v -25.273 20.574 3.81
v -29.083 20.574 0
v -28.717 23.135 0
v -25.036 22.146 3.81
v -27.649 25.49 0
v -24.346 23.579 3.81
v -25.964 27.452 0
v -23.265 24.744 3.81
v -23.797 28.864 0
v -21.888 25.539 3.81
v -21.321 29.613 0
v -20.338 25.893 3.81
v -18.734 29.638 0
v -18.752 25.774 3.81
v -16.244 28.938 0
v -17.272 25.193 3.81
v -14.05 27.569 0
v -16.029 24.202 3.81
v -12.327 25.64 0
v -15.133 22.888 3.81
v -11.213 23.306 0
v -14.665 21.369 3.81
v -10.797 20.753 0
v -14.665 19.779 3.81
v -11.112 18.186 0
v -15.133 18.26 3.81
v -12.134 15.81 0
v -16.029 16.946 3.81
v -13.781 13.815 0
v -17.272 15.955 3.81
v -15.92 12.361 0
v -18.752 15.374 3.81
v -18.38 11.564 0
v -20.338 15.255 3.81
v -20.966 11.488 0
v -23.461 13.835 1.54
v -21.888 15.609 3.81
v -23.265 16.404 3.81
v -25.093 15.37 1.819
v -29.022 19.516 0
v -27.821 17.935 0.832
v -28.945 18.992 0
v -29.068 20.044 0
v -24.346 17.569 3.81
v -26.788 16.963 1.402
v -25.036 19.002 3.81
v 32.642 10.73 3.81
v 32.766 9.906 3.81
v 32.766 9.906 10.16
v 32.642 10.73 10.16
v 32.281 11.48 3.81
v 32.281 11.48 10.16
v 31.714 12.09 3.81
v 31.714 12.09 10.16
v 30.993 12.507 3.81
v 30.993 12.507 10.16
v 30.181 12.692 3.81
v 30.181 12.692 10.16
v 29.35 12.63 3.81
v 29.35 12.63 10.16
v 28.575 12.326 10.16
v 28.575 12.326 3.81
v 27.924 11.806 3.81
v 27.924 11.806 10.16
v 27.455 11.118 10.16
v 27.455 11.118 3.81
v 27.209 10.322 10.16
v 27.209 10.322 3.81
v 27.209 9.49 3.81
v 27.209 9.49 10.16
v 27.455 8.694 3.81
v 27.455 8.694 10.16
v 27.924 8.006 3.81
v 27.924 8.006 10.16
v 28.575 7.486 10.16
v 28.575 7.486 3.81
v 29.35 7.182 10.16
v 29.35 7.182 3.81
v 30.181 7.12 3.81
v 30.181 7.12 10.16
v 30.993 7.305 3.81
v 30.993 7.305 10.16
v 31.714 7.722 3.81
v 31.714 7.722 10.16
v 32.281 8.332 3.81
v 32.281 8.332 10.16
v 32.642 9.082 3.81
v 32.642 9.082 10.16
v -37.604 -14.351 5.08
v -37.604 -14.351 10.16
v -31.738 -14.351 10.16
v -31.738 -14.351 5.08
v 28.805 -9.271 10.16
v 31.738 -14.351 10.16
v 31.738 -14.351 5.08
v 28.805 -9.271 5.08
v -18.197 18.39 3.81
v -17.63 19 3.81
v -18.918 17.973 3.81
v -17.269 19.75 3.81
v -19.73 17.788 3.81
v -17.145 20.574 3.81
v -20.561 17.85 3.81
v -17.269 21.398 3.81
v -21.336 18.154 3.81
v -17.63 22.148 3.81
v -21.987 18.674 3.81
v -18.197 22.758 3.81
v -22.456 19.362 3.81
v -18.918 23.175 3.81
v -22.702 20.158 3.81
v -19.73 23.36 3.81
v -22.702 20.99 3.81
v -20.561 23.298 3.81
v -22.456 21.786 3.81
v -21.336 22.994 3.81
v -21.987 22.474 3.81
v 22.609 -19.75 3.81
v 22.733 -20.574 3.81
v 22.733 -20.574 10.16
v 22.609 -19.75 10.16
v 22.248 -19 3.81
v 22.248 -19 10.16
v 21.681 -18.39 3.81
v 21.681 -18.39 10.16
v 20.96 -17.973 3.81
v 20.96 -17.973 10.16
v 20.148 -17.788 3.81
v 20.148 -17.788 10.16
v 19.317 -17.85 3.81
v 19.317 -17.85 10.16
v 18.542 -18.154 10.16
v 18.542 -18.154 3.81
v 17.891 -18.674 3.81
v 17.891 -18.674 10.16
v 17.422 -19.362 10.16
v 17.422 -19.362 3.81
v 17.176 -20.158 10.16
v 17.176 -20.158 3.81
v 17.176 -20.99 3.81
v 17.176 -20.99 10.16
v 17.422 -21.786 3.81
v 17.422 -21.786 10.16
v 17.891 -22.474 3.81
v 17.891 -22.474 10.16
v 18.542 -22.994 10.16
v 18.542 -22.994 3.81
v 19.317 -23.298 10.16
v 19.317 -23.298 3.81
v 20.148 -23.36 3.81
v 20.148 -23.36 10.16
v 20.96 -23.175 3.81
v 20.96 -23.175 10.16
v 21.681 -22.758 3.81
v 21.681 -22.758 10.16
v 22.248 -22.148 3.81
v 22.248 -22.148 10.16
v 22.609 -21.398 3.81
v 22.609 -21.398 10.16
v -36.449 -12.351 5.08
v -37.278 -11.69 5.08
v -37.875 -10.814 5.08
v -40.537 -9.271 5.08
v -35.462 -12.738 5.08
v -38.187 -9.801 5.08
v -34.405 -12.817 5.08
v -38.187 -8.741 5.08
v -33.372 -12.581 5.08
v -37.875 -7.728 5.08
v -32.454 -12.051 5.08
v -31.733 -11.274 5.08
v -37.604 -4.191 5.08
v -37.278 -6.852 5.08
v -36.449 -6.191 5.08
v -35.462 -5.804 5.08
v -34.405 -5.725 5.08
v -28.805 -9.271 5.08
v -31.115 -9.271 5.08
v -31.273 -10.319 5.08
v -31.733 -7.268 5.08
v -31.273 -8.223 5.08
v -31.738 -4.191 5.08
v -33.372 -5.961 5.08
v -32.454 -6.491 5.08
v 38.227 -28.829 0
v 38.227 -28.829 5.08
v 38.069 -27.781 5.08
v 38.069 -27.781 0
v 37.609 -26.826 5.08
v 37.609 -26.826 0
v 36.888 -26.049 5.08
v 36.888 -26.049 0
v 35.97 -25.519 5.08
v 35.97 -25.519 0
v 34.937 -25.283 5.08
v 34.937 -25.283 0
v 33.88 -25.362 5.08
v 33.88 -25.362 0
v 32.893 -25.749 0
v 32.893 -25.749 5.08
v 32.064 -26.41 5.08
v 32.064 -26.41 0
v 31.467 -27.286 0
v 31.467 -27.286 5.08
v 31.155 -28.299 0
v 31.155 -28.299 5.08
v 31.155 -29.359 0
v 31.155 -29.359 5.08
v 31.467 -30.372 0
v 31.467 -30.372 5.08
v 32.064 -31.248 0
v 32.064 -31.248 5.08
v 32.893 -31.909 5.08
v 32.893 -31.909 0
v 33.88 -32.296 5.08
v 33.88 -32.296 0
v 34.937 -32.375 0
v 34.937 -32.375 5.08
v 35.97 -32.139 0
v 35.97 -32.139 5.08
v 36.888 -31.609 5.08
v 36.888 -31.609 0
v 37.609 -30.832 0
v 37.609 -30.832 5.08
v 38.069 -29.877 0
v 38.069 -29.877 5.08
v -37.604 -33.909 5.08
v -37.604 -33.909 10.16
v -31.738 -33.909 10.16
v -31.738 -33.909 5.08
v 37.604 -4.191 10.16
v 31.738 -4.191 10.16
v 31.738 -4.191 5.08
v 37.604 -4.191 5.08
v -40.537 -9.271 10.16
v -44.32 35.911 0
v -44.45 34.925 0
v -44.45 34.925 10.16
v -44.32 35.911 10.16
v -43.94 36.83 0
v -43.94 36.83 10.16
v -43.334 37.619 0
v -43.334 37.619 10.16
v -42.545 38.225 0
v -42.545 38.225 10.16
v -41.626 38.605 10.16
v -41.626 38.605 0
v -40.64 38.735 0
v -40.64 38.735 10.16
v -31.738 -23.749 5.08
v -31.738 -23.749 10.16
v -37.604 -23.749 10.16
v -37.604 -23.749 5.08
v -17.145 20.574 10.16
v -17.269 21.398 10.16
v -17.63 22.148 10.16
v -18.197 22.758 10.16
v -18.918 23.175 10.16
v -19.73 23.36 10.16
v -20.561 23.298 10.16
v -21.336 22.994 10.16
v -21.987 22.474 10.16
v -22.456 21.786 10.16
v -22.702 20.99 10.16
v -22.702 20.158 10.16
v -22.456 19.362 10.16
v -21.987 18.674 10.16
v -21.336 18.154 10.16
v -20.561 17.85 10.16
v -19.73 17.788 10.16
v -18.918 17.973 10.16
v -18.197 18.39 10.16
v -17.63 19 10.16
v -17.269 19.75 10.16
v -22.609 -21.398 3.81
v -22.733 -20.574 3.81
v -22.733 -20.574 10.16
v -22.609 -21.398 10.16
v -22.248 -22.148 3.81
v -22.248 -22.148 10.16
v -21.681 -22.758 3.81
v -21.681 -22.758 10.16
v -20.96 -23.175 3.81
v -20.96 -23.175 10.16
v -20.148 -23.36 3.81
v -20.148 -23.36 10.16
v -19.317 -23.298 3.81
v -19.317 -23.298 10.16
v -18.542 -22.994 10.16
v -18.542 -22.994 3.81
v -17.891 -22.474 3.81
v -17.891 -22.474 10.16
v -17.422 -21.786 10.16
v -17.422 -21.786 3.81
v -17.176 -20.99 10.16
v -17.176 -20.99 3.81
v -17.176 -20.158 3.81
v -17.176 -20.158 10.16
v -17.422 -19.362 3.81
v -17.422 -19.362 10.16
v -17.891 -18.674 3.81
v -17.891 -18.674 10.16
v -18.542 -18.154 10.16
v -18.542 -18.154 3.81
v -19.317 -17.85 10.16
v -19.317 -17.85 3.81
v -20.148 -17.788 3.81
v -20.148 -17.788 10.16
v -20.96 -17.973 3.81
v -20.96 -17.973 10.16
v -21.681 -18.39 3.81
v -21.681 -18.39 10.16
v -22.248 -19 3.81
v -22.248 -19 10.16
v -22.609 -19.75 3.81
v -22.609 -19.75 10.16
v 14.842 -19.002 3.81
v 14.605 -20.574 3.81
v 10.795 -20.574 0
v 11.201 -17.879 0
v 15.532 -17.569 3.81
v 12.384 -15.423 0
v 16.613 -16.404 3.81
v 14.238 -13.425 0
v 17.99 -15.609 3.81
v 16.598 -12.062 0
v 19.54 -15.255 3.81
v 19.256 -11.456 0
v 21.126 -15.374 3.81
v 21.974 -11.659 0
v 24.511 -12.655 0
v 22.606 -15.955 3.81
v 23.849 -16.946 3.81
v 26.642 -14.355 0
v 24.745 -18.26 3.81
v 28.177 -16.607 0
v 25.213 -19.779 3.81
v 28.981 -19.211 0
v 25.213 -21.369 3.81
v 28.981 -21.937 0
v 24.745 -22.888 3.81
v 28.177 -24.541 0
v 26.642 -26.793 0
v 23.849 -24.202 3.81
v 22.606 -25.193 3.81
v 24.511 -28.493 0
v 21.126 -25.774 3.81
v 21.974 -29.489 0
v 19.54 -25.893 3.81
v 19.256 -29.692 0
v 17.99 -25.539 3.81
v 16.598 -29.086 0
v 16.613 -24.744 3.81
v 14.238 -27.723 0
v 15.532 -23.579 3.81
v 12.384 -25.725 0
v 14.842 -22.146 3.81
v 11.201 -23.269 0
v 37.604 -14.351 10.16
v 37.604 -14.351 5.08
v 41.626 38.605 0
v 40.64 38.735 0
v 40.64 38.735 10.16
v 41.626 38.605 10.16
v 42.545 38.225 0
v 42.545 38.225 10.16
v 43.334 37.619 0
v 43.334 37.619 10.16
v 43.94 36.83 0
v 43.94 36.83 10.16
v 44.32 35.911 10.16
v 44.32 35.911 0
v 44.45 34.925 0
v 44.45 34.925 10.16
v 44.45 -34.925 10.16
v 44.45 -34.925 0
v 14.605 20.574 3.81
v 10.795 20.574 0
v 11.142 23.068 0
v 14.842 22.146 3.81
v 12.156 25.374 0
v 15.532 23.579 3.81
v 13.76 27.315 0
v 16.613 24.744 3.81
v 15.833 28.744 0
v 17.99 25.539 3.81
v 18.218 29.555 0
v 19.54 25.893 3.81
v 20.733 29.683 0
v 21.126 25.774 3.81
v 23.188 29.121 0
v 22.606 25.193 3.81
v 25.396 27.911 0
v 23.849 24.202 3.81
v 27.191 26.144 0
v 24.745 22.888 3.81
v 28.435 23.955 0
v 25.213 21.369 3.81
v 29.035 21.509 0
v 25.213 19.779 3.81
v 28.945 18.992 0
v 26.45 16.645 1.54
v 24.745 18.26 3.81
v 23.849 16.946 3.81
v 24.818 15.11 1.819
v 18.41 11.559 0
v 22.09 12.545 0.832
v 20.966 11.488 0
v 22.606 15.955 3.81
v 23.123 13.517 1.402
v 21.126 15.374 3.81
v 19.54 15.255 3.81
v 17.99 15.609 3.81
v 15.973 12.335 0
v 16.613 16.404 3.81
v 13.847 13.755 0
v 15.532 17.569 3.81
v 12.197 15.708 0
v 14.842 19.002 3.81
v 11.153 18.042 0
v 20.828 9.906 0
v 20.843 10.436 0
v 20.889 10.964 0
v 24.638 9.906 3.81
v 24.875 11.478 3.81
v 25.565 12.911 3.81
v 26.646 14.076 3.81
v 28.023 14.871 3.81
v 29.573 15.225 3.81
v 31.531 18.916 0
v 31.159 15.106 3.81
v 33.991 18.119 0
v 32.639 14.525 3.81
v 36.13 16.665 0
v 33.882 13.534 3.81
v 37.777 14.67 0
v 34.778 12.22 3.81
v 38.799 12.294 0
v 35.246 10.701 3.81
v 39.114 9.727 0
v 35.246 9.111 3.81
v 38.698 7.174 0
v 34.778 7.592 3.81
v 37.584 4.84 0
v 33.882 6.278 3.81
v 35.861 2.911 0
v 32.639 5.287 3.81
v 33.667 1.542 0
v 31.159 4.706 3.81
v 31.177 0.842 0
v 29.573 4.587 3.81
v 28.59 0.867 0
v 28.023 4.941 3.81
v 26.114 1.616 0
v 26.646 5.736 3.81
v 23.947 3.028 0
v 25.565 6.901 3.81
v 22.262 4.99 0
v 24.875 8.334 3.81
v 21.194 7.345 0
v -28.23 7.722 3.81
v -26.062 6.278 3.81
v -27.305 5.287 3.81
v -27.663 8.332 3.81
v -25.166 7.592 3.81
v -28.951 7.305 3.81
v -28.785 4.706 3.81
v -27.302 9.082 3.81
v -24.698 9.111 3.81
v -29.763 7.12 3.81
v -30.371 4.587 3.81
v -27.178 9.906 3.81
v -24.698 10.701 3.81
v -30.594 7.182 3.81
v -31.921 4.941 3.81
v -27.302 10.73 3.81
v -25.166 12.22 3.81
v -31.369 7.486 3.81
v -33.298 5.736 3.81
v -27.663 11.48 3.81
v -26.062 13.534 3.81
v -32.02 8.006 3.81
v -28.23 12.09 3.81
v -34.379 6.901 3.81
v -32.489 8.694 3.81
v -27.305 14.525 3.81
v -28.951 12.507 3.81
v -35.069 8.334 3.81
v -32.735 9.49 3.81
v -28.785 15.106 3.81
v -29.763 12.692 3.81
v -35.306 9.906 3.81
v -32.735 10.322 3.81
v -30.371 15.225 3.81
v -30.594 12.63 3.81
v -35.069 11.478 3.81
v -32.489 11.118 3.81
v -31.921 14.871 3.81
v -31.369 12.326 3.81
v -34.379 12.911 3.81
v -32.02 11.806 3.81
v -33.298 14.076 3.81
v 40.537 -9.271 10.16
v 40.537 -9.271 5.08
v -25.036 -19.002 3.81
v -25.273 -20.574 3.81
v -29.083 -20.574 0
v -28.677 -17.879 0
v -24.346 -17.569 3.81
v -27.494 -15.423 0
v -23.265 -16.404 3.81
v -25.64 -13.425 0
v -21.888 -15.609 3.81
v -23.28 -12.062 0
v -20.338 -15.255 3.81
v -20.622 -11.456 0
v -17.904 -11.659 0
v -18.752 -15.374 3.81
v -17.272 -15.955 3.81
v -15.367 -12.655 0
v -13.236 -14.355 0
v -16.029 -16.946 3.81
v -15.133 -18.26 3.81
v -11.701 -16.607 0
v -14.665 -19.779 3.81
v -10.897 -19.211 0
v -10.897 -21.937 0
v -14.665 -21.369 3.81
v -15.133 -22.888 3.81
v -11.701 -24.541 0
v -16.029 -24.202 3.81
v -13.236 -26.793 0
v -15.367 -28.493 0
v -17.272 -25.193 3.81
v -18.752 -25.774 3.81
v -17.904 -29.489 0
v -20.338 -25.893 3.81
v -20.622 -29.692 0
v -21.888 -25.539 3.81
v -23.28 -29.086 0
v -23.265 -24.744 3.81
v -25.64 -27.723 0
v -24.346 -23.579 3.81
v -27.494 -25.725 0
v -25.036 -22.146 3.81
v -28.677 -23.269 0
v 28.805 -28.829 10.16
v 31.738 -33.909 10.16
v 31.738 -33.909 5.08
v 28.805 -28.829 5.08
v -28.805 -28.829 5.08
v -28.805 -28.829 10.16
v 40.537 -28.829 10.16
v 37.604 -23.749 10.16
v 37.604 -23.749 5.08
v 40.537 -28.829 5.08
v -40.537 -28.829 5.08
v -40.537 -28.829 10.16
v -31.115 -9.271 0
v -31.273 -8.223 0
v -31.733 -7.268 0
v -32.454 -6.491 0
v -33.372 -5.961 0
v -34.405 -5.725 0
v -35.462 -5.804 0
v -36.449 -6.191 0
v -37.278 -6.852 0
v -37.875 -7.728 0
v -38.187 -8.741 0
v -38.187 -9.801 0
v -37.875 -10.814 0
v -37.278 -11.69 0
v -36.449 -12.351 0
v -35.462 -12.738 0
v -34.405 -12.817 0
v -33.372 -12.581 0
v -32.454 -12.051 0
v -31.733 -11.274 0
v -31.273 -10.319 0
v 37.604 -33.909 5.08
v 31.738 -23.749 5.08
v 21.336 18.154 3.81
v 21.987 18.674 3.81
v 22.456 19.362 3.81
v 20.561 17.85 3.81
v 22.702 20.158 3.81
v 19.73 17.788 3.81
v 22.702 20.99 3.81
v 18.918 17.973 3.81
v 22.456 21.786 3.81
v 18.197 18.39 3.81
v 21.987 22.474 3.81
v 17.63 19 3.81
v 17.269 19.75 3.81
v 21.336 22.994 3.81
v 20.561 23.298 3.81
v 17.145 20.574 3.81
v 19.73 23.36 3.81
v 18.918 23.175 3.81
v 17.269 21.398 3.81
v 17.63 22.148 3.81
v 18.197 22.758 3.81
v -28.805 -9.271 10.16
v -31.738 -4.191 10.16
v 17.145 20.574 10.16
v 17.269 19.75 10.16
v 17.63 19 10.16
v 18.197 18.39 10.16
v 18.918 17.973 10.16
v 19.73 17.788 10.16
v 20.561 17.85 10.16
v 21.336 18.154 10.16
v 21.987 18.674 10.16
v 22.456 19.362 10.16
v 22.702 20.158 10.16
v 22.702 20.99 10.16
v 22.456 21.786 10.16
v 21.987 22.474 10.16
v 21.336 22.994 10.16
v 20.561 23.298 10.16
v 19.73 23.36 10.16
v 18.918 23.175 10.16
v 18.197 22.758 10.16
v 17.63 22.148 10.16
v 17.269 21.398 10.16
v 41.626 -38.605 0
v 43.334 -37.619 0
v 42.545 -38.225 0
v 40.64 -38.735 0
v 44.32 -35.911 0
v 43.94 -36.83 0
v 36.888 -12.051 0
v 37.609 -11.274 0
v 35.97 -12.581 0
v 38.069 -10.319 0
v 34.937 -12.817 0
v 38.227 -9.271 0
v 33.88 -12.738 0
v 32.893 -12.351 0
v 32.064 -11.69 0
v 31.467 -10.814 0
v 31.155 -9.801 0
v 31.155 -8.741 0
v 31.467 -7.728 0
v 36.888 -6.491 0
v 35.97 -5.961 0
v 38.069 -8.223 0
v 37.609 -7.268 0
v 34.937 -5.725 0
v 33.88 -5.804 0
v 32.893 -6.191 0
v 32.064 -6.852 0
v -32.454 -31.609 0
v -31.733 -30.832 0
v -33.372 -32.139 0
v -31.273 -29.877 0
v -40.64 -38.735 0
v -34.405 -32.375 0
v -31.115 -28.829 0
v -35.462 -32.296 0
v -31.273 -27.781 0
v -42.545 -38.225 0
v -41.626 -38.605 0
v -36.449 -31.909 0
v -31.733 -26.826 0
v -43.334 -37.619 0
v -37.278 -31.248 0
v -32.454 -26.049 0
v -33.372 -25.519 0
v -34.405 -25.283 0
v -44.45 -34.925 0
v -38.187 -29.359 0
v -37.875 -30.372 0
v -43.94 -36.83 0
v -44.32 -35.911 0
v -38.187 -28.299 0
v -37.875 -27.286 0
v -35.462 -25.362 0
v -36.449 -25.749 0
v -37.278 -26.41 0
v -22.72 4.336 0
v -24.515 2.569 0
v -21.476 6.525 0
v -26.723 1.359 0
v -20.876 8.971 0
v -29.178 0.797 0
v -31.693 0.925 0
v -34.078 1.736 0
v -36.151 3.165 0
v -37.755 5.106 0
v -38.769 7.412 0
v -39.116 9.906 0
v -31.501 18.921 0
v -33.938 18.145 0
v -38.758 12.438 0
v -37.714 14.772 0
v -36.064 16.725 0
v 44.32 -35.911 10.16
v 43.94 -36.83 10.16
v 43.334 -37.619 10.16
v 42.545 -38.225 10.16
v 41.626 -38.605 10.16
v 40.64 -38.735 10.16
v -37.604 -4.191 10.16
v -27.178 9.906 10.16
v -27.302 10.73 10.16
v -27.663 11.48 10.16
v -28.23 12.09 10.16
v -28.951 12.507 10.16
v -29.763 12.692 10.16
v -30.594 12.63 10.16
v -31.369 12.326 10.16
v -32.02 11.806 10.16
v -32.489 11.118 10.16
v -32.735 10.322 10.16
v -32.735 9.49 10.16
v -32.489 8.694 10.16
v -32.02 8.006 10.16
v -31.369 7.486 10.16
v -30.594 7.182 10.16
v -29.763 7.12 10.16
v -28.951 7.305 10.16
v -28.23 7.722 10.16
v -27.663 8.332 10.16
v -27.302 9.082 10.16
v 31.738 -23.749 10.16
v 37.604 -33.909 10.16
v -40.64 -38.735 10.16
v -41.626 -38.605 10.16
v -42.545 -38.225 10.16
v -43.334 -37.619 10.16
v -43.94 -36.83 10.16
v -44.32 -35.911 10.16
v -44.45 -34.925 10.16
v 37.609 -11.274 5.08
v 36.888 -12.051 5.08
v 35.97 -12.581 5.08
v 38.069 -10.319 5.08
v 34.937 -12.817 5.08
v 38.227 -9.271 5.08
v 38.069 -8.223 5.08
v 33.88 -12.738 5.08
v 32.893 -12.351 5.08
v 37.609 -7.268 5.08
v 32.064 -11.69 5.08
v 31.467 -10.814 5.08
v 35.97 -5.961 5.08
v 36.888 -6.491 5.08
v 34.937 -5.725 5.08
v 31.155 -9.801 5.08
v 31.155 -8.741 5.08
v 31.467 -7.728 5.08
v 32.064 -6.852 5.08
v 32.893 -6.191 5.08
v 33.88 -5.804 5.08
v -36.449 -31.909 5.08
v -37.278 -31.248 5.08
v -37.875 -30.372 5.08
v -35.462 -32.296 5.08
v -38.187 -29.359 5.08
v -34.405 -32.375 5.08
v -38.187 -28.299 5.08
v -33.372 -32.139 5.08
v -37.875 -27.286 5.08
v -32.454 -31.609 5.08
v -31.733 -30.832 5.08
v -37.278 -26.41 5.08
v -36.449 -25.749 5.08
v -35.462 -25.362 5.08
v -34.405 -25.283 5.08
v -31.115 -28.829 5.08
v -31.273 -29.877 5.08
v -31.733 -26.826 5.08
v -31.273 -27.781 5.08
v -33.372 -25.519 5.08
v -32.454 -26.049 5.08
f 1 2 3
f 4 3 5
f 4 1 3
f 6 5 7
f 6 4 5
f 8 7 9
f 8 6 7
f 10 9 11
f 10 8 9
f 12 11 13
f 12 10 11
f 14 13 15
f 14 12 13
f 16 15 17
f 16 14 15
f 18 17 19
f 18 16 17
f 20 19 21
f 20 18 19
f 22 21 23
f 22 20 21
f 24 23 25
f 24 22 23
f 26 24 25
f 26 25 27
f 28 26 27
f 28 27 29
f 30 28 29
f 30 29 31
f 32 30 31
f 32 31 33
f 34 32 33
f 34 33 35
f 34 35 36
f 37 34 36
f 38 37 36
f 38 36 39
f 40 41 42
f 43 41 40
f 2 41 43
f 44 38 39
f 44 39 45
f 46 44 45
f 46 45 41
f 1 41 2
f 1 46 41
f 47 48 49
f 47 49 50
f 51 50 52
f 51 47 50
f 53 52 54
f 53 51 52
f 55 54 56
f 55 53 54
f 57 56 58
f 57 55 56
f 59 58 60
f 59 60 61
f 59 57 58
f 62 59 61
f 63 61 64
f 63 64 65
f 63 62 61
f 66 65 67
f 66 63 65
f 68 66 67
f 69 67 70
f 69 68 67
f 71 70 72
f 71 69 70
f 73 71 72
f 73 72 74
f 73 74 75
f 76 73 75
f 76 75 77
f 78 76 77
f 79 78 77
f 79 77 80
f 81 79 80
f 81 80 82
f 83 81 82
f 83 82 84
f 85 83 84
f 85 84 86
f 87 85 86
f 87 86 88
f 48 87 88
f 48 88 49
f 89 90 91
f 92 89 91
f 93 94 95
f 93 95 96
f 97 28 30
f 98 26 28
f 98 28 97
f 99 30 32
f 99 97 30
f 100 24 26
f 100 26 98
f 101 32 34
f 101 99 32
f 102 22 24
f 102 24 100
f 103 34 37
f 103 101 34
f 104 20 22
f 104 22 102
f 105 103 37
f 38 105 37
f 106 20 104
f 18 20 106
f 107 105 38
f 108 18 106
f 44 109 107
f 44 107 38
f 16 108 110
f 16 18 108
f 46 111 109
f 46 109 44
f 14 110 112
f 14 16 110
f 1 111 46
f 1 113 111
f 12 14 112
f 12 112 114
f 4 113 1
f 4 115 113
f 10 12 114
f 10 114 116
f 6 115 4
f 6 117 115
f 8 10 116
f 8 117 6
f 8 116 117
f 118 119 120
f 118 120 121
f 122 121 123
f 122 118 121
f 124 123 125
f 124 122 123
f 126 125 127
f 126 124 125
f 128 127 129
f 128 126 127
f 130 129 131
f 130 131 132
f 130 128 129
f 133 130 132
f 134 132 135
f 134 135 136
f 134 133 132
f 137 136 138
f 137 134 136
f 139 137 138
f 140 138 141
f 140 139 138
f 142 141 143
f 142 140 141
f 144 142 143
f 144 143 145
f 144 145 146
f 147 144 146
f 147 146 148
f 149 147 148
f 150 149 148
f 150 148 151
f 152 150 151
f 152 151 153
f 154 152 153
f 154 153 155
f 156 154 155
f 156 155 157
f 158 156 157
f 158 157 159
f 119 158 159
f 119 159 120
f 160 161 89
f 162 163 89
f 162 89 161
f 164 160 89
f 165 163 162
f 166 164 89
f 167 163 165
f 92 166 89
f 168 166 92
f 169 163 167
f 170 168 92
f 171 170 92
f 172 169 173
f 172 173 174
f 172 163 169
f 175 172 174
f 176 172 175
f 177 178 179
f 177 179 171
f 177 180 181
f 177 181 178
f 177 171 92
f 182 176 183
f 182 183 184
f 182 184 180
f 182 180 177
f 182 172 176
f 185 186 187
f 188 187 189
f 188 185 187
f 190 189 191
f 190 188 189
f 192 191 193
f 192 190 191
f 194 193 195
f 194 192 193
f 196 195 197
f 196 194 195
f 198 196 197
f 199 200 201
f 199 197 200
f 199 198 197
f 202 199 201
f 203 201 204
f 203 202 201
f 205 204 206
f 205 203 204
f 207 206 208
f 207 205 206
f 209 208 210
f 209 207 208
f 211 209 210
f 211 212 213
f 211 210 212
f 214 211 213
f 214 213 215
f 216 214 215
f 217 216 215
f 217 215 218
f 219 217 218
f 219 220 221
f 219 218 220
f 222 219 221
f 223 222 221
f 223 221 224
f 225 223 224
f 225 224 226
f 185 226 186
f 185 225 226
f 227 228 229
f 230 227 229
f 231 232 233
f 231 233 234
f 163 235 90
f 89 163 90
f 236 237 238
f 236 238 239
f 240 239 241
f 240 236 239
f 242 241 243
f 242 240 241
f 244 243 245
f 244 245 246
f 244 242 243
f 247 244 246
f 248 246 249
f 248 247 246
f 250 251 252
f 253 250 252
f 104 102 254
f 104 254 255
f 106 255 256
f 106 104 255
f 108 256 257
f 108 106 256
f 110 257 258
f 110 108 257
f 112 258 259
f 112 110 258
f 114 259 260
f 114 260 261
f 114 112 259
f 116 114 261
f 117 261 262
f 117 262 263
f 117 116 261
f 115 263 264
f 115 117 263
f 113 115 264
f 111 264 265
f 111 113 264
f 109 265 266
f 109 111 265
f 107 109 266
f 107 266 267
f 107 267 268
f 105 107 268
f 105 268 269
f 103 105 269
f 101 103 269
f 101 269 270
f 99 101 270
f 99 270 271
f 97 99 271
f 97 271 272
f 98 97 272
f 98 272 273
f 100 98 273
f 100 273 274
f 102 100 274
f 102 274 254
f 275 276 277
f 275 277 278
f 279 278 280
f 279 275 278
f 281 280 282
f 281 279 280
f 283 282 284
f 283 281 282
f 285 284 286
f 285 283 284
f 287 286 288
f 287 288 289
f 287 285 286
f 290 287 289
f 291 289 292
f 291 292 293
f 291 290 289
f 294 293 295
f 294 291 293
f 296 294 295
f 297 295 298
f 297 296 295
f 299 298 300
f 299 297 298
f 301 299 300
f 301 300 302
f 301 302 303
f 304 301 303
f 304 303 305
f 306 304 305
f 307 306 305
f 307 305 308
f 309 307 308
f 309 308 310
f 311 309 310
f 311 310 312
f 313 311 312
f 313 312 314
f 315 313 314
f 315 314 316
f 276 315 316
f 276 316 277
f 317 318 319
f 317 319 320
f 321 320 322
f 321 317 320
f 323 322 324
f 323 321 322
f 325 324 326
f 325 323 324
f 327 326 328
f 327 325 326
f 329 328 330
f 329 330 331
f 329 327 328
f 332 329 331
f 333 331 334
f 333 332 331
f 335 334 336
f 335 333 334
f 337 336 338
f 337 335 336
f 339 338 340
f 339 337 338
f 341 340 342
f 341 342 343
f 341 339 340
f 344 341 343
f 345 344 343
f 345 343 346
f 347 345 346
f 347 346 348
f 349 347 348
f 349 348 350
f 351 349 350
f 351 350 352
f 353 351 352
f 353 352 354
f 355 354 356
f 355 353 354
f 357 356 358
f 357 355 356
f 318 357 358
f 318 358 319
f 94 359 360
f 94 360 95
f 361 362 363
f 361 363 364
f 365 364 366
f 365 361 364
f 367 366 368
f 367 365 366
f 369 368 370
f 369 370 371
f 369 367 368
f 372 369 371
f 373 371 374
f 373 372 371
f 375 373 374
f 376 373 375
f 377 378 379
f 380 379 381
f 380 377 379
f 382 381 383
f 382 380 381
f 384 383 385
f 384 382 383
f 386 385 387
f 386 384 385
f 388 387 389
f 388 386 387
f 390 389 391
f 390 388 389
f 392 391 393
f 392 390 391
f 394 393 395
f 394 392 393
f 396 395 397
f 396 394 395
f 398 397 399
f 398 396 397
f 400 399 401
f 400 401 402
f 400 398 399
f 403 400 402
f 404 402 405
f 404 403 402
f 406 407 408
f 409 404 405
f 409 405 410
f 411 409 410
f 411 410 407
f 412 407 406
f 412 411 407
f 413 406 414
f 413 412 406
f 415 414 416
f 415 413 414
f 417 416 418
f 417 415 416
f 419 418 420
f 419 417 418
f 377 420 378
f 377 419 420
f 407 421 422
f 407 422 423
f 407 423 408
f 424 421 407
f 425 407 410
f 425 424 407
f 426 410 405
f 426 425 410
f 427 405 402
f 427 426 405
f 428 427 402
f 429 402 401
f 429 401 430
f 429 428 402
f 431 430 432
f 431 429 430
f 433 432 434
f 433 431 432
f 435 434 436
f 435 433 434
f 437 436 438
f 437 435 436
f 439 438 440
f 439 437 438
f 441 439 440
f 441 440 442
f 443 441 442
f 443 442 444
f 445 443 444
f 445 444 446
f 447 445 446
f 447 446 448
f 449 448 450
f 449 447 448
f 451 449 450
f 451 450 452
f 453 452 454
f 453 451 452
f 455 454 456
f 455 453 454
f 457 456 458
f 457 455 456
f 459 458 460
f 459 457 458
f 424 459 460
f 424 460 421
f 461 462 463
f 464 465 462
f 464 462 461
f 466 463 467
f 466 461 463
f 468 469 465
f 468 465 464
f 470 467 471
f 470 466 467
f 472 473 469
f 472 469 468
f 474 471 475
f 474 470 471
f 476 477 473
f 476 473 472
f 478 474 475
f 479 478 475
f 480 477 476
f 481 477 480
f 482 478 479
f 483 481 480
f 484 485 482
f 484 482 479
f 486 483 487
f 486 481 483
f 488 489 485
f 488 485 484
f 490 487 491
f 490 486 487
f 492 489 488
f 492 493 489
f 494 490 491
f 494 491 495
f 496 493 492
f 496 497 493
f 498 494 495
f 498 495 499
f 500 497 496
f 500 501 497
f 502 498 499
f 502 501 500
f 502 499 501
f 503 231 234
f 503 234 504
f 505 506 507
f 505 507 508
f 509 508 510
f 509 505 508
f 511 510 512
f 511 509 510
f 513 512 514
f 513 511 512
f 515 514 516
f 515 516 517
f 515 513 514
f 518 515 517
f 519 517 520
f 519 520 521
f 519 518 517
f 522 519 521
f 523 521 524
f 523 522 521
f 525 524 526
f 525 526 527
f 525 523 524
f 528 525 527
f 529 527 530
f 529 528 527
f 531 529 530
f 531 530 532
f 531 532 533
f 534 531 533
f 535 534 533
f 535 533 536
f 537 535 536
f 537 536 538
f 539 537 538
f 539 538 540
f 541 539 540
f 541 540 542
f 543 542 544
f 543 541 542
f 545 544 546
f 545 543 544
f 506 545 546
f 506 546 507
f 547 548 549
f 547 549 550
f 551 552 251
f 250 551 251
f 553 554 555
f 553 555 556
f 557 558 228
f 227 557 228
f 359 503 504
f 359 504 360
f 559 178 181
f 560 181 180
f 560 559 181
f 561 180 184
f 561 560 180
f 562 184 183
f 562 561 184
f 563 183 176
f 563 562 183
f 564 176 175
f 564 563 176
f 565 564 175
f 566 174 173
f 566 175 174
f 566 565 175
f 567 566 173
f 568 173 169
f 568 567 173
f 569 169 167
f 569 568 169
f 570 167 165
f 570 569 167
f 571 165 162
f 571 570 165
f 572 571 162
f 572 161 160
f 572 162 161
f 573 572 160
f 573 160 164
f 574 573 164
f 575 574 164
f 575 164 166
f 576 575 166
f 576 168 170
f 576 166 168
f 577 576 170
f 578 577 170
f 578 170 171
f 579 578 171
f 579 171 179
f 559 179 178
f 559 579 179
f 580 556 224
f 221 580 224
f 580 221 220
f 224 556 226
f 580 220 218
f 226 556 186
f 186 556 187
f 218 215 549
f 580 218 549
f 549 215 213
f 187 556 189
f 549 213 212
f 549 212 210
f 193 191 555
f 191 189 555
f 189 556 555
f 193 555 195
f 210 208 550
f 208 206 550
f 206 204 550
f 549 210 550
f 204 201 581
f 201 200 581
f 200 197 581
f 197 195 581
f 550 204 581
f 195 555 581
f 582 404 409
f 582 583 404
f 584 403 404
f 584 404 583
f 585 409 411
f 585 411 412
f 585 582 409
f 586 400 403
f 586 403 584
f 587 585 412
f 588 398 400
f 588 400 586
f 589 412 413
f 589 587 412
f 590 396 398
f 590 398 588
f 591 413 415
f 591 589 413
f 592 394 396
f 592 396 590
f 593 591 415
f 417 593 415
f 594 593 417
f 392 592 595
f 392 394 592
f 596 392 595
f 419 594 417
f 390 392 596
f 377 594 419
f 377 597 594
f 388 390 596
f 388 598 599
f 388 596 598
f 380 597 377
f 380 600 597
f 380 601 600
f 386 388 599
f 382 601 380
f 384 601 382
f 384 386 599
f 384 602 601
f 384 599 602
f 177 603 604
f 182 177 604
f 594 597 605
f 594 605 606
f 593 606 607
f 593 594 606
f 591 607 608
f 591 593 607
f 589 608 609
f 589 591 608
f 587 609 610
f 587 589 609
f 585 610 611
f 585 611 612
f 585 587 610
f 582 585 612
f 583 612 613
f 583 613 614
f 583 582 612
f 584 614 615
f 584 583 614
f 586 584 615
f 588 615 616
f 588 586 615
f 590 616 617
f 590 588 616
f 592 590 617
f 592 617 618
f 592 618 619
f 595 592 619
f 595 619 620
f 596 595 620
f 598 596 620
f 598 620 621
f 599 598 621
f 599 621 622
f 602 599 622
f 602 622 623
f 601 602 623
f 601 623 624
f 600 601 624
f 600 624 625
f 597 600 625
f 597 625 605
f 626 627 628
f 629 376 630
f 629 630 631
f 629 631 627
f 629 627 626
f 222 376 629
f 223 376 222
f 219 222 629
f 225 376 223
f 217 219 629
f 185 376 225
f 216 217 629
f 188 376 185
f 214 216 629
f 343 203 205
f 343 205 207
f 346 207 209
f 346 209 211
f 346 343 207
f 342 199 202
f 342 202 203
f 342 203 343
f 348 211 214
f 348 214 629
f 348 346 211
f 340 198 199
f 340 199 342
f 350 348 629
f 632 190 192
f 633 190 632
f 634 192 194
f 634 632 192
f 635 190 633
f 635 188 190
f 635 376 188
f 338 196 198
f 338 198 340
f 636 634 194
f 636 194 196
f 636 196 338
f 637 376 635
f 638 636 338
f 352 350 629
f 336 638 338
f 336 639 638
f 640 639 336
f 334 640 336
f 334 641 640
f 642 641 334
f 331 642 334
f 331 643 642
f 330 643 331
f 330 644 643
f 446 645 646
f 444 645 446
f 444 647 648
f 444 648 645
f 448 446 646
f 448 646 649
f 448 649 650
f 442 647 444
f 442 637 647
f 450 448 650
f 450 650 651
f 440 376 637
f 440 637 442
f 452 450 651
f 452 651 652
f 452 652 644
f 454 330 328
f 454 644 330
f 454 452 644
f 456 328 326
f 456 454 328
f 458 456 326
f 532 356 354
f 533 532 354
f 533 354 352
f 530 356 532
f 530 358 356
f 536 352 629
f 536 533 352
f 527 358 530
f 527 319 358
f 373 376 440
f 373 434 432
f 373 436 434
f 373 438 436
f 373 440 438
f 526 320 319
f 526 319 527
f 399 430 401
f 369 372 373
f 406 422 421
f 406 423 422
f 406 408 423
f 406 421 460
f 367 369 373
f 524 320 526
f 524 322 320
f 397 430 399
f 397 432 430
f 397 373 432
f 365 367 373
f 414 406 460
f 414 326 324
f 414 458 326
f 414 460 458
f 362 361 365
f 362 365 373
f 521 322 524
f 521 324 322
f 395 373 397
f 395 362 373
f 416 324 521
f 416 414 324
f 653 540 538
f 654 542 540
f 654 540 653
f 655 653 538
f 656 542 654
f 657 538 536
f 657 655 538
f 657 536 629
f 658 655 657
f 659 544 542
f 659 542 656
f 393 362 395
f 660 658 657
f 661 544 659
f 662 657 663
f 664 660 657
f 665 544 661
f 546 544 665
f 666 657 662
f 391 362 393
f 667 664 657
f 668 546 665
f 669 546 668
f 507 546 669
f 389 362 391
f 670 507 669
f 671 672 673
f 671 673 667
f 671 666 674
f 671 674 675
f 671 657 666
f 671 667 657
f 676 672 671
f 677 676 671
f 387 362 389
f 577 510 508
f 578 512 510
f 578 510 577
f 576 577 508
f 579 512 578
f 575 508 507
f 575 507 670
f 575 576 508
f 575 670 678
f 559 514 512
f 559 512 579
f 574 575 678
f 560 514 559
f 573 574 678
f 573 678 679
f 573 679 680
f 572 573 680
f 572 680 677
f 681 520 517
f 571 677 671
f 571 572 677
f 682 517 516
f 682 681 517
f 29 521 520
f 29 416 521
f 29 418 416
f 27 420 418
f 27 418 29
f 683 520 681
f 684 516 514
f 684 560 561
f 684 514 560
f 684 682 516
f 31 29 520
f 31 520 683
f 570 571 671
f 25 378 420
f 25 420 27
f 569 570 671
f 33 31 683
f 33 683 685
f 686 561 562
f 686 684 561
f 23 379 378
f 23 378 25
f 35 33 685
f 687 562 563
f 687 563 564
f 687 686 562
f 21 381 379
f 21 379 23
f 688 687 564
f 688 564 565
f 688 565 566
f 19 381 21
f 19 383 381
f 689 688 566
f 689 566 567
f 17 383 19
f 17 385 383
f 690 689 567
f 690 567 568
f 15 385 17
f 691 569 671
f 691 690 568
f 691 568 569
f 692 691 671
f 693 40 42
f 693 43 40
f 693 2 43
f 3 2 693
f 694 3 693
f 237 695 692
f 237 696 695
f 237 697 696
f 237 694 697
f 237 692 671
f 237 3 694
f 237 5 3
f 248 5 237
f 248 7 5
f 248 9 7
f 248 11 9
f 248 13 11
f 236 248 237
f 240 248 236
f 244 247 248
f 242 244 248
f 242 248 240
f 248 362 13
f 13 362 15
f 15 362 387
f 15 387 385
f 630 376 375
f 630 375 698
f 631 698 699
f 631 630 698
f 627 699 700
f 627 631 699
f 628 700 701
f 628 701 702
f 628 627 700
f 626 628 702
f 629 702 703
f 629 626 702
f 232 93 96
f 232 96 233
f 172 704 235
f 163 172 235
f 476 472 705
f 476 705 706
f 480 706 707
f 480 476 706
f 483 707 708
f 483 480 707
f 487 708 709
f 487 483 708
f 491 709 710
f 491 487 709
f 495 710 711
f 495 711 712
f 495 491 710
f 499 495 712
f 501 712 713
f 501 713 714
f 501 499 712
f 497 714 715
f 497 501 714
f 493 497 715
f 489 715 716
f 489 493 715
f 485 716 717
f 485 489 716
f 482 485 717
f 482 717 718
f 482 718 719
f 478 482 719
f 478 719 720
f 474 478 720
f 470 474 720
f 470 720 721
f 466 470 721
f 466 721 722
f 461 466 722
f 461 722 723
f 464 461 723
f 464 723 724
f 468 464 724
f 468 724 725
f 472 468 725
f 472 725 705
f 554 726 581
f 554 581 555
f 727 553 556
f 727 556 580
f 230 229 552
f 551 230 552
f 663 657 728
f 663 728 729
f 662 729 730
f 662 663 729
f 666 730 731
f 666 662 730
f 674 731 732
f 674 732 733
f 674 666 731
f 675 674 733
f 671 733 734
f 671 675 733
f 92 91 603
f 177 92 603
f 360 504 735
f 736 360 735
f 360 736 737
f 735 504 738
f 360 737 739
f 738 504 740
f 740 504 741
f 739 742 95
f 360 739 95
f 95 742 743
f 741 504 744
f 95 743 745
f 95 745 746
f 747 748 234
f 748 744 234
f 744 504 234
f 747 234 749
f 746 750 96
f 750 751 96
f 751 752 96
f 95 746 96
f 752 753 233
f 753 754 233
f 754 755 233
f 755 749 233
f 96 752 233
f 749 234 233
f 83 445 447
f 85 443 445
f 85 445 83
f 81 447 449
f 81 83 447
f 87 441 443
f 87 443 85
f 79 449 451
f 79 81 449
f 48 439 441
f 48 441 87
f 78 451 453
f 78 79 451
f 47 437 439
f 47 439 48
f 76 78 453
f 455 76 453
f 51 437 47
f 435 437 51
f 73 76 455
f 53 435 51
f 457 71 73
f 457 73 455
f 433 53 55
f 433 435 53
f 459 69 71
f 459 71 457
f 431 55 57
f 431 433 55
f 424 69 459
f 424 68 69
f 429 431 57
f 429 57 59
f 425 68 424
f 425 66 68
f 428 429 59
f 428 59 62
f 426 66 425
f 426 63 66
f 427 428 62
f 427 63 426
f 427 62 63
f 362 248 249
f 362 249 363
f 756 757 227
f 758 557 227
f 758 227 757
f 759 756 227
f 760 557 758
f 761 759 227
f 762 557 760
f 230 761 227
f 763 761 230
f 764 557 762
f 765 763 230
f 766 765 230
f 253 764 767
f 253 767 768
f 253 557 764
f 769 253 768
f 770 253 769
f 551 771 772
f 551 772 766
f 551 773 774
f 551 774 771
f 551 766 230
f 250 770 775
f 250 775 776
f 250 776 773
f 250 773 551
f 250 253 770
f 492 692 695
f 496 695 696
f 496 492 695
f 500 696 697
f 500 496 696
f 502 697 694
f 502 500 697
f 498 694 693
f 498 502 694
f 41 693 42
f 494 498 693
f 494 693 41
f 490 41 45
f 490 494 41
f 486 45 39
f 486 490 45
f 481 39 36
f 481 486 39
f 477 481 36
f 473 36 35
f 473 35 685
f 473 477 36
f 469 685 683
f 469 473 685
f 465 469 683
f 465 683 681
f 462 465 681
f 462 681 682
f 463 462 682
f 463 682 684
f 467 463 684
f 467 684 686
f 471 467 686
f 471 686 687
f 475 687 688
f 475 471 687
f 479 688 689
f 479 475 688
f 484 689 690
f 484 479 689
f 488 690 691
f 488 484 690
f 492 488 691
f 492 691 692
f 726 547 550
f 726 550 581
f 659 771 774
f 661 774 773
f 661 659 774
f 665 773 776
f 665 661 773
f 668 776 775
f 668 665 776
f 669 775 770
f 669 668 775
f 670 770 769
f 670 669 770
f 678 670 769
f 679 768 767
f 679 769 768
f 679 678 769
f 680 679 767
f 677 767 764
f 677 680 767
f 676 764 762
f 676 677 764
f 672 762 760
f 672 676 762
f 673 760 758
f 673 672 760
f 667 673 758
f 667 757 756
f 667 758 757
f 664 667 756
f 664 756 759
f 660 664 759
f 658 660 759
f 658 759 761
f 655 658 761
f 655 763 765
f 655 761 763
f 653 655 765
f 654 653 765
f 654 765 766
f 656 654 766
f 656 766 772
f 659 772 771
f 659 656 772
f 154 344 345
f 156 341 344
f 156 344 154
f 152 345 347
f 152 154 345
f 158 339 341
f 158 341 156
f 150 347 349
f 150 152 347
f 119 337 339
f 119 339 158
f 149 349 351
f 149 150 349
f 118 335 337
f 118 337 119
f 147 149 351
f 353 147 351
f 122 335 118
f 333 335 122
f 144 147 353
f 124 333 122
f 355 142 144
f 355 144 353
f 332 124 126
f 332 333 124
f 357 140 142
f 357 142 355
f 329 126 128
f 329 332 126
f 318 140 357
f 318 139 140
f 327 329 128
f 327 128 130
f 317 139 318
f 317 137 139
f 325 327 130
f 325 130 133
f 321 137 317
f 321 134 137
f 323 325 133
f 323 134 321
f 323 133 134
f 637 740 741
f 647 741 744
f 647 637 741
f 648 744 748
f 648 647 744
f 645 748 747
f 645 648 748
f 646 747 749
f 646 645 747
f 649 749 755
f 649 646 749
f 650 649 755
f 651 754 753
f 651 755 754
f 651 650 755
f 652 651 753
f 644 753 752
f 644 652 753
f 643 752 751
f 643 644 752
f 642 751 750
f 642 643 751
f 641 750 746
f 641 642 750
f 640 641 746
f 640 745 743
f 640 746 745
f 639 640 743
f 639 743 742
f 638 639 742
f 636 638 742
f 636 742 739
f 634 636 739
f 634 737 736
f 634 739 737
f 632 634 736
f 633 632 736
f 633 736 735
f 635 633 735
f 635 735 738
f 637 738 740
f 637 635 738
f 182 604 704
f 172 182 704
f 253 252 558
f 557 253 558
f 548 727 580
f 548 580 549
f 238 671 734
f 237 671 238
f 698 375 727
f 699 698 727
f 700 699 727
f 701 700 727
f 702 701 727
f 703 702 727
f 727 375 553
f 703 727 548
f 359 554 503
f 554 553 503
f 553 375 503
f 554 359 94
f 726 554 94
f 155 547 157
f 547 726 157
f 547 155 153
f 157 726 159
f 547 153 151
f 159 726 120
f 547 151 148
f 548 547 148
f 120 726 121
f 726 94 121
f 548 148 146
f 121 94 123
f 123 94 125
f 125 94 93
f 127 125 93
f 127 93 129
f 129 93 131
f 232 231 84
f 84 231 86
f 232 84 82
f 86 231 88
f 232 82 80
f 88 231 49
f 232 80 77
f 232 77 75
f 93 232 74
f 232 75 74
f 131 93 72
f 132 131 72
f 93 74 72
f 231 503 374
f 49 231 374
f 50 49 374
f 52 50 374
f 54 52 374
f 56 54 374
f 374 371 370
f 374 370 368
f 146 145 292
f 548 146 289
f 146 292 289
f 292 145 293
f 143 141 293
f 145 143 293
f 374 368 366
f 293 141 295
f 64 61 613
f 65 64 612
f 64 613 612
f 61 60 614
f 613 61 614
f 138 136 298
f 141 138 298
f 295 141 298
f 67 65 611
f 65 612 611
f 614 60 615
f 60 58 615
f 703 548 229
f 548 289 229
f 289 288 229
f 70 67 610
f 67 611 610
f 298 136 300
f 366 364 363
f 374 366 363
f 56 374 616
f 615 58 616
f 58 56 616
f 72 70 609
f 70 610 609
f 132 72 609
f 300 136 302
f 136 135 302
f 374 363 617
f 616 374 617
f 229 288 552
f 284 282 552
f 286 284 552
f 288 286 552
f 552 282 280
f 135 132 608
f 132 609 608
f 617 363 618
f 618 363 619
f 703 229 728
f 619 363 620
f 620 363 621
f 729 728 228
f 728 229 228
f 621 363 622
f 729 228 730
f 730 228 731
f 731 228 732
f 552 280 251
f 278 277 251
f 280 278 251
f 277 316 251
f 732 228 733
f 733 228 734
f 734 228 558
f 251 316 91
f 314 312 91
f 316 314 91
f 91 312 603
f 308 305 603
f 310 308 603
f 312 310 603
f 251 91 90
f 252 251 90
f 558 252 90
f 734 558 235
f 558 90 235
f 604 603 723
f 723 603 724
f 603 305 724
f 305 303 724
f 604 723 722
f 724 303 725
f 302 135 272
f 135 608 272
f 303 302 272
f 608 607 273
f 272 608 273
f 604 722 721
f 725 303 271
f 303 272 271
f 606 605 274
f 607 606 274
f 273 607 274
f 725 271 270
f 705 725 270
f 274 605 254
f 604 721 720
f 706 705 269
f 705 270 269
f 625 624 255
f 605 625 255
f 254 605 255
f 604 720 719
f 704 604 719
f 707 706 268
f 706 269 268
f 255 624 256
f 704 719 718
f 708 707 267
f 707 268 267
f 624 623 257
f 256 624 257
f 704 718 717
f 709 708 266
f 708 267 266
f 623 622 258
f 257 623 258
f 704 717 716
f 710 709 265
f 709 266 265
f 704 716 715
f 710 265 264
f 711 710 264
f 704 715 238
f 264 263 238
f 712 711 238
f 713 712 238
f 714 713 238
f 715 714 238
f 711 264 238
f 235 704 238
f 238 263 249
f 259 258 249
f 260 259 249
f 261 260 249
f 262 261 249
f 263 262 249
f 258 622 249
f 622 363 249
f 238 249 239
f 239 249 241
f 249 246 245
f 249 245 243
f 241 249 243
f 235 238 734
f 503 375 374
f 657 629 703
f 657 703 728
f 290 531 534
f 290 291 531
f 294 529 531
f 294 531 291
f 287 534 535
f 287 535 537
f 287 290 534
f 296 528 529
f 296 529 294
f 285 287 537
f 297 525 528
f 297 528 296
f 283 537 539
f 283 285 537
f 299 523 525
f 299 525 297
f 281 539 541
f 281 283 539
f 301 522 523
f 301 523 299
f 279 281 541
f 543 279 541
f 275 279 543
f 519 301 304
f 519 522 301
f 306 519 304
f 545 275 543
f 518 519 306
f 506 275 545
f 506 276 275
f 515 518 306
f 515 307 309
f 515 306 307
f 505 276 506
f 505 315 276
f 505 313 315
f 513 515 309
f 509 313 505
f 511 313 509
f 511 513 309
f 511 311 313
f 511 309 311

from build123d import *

# Parameters (mm, degrees)
SKETCH1_R           = 3.556
SKETCH1_R_2         = 2.794
BOSS_EXTRUDE1_DEPTH = 10.16
SKETCH2_R           = 5.334
CUT_EXTRUDE1_DEPTH  = 3.81
CUT_EXTRUDE2_DEPTH  = 5.08
CHAMFER1_SIZE       = 3.81


with BuildPart() as part:
    # Sketch1 → Boss-Extrude1 (new body)
    with BuildSketch(Plane.XY):
        with BuildLine():
            Line((40.64, -38.735), (-40.64, -38.735))
            ThreePointArc((-40.64, -38.735), (-43.334076836, -37.619076836), (-44.45, -34.925))
            Line((-44.45, -34.925), (-44.45, 34.925))
            ThreePointArc((-44.45, 34.925), (-43.334076836, 37.619076836), (-40.64, 38.735))
            Line((-40.64, 38.735), (40.64, 38.735))
            ThreePointArc((40.64, 38.735), (43.334076836, 37.619076836), (44.45, 34.925))
            Line((44.45, 34.925), (44.45, -34.925))
            ThreePointArc((44.45, -34.925), (43.334076836, -37.619076836), (40.64, -38.735))
        make_face()
        with Locations((-34.671, -9.271)):
            Circle(SKETCH1_R, mode=Mode.SUBTRACT)
        with Locations((-34.671, -28.829)):
            Circle(SKETCH1_R, mode=Mode.SUBTRACT)
        with Locations((34.671, -9.271)):
            Circle(SKETCH1_R, mode=Mode.SUBTRACT)
        with Locations((34.671, -28.829)):
            Circle(SKETCH1_R, mode=Mode.SUBTRACT)
        with Locations((-19.939, 20.574)):
            Circle(SKETCH1_R_2, mode=Mode.SUBTRACT)
        with Locations(Location((19.939, 20.574, 0), (0, 0, 180))):
            Circle(SKETCH1_R_2, mode=Mode.SUBTRACT)
        with Locations((19.939, -20.574)):
            Circle(SKETCH1_R_2, mode=Mode.SUBTRACT)
        with Locations(Location((-19.939, -20.574, 0), (0, 0, 180))):
            Circle(SKETCH1_R_2, mode=Mode.SUBTRACT)
        with Locations((29.972, 9.906)):
            Circle(SKETCH1_R_2, mode=Mode.SUBTRACT)
        with Locations((-29.972, 9.906)):
            Circle(SKETCH1_R_2, mode=Mode.SUBTRACT)
    extrude(amount=BOSS_EXTRUDE1_DEPTH)

    # Sketch2 → Cut-Extrude1 (cut)
    with BuildSketch(Plane(origin=(0, 0, 0), x_dir=(-1, 0, 0), z_dir=(0, 0, -1))):
        with Locations((-19.939, 20.574)):
            Circle(SKETCH2_R)
        with Locations((19.939, -20.574)):
            Circle(SKETCH2_R)
        with Locations((-19.939, -20.574)):
            Circle(SKETCH2_R)
        with Locations((19.939, 20.574)):
            Circle(SKETCH2_R)
        with Locations((-29.972, 9.906)):
            Circle(SKETCH2_R)
        with Locations((29.972, 9.906)):
            Circle(SKETCH2_R)
    extrude(amount=-CUT_EXTRUDE1_DEPTH, mode=Mode.SUBTRACT)

    # Sketch3 → Cut-Extrude2 (cut)
    with BuildSketch(Plane.XY.offset(10.16)):
        Polygon((-31.738060633, -14.351), (-28.805121265, -9.271), (-31.738060633, -4.191), (-37.603939367, -4.191), (-40.536878735, -9.271), (-37.603939367, -14.351), align=None)
        Polygon((-31.738060633, -33.909), (-28.805121265, -28.829), (-31.738060633, -23.749), (-37.603939367, -23.749), (-40.536878735, -28.829), (-37.603939367, -33.909), align=None)
        Polygon((37.603939367, -33.909), (31.738060633, -33.909), (28.805121265, -28.829), (31.738060633, -23.749), (37.603939367, -23.749), (40.536878735, -28.829), align=None)
        Polygon((37.603939367, -14.351), (31.738060633, -14.351), (28.805121265, -9.271), (31.738060633, -4.191), (37.603939367, -4.191), (40.536878735, -9.271), align=None)
    extrude(amount=-CUT_EXTRUDE2_DEPTH, mode=Mode.SUBTRACT)

    # Chamfer1
    # the kernel refuses this chamfer: 3.81 mm, written as the material it takes off along each edge
    with BuildSketch(Plane(origin=(19.939, 20.574, 0), x_dir=(-1, 0, 0), z_dir=(0, -1, 0))) as chamfer1_piece_1_section:
        Polygon((5.334 + CHAMFER1_SIZE, 0), (5.334, -CHAMFER1_SIZE), (5.334, 0), align=None)
    chamfer1_piece_1 = revolve(axis=Axis((19.939, 20.574, 0), (0, 0, -1)), mode=Mode.PRIVATE)
    chamfer1_piece_1 = split(chamfer1_piece_1, bisect_by=Plane(origin=(27.18300283, 20.574, 3.81), z_dir=(0, 0, -1)), keep=Keep.TOP, mode=Mode.PRIVATE)
    add(chamfer1_piece_1, mode=Mode.SUBTRACT)
    with BuildSketch(Plane(origin=(-19.939, 20.574, 0), x_dir=(-1, 0, 0), z_dir=(0, -1, 0))) as chamfer1_piece_2_section:
        Polygon((5.334 + CHAMFER1_SIZE, 0), (5.334, -CHAMFER1_SIZE), (5.334, 0), align=None)
    chamfer1_piece_2 = revolve(axis=Axis((-19.939, 20.574, 0), (0, 0, -1)), mode=Mode.PRIVATE)
    chamfer1_piece_2 = split(chamfer1_piece_2, bisect_by=Plane(origin=(-12.694997174, 20.574, 3.81), z_dir=(0, 0, -1)), keep=Keep.TOP, mode=Mode.PRIVATE)
    add(chamfer1_piece_2, mode=Mode.SUBTRACT)
    with BuildSketch(Plane(origin=(-19.939, -20.574, 0), x_dir=(-1, 0, 0), z_dir=(0, -1, 0))) as chamfer1_piece_3_section:
        Polygon((5.334 + CHAMFER1_SIZE, 0), (5.334, -CHAMFER1_SIZE), (5.334, 0), align=None)
    chamfer1_piece_3 = revolve(axis=Axis((-19.939, -20.574, 0), (0, 0, -1)), mode=Mode.PRIVATE)
    chamfer1_piece_3 = split(chamfer1_piece_3, bisect_by=Plane(origin=(-12.694997169, -20.574, 3.81), z_dir=(0, 0, -1)), keep=Keep.TOP, mode=Mode.PRIVATE)
    add(chamfer1_piece_3, mode=Mode.SUBTRACT)
    with BuildSketch(Plane(origin=(19.939, -20.574, 0), x_dir=(-1, 0, 0), z_dir=(0, -1, 0))) as chamfer1_piece_4_section:
        Polygon((5.334 + CHAMFER1_SIZE, 0), (5.334, -CHAMFER1_SIZE), (5.334, 0), align=None)
    chamfer1_piece_4 = revolve(axis=Axis((19.939, -20.574, 0), (0, 0, -1)), mode=Mode.PRIVATE)
    chamfer1_piece_4 = split(chamfer1_piece_4, bisect_by=Plane(origin=(27.183002828, -20.574, 3.81), z_dir=(0, 0, -1)), keep=Keep.TOP, mode=Mode.PRIVATE)
    add(chamfer1_piece_4, mode=Mode.SUBTRACT)
    with BuildSketch(Plane(origin=(29.972, 9.906, 0), x_dir=(-1, 0, 0), z_dir=(0, -1, 0))) as chamfer1_piece_5_section:
        Polygon((5.334 + CHAMFER1_SIZE, 0), (5.334, -CHAMFER1_SIZE), (5.334, 0), align=None)
    chamfer1_piece_5 = revolve(axis=Axis((29.972, 9.906, 0), (0, 0, -1)), mode=Mode.PRIVATE)
    chamfer1_piece_5 = split(chamfer1_piece_5, bisect_by=Plane(origin=(37.216002826, 9.906, 3.81), z_dir=(0, 0, -1)), keep=Keep.TOP, mode=Mode.PRIVATE)
    add(chamfer1_piece_5, mode=Mode.SUBTRACT)
    with BuildSketch(Plane(origin=(-29.972, 9.906, 0), x_dir=(-1, 0, 0), z_dir=(0, -1, 0))) as chamfer1_piece_6_section:
        Polygon((5.334 + CHAMFER1_SIZE, 0), (5.334, -CHAMFER1_SIZE), (5.334, 0), align=None)
    chamfer1_piece_6 = revolve(axis=Axis((-29.972, 9.906, 0), (0, 0, -1)), mode=Mode.PRIVATE)
    chamfer1_piece_6 = split(chamfer1_piece_6, bisect_by=Plane(origin=(-22.727997169, 9.906, 3.81), z_dir=(0, 0, -1)), keep=Keep.TOP, mode=Mode.PRIVATE)
    add(chamfer1_piece_6, mode=Mode.SUBTRACT)


solid = part.part
